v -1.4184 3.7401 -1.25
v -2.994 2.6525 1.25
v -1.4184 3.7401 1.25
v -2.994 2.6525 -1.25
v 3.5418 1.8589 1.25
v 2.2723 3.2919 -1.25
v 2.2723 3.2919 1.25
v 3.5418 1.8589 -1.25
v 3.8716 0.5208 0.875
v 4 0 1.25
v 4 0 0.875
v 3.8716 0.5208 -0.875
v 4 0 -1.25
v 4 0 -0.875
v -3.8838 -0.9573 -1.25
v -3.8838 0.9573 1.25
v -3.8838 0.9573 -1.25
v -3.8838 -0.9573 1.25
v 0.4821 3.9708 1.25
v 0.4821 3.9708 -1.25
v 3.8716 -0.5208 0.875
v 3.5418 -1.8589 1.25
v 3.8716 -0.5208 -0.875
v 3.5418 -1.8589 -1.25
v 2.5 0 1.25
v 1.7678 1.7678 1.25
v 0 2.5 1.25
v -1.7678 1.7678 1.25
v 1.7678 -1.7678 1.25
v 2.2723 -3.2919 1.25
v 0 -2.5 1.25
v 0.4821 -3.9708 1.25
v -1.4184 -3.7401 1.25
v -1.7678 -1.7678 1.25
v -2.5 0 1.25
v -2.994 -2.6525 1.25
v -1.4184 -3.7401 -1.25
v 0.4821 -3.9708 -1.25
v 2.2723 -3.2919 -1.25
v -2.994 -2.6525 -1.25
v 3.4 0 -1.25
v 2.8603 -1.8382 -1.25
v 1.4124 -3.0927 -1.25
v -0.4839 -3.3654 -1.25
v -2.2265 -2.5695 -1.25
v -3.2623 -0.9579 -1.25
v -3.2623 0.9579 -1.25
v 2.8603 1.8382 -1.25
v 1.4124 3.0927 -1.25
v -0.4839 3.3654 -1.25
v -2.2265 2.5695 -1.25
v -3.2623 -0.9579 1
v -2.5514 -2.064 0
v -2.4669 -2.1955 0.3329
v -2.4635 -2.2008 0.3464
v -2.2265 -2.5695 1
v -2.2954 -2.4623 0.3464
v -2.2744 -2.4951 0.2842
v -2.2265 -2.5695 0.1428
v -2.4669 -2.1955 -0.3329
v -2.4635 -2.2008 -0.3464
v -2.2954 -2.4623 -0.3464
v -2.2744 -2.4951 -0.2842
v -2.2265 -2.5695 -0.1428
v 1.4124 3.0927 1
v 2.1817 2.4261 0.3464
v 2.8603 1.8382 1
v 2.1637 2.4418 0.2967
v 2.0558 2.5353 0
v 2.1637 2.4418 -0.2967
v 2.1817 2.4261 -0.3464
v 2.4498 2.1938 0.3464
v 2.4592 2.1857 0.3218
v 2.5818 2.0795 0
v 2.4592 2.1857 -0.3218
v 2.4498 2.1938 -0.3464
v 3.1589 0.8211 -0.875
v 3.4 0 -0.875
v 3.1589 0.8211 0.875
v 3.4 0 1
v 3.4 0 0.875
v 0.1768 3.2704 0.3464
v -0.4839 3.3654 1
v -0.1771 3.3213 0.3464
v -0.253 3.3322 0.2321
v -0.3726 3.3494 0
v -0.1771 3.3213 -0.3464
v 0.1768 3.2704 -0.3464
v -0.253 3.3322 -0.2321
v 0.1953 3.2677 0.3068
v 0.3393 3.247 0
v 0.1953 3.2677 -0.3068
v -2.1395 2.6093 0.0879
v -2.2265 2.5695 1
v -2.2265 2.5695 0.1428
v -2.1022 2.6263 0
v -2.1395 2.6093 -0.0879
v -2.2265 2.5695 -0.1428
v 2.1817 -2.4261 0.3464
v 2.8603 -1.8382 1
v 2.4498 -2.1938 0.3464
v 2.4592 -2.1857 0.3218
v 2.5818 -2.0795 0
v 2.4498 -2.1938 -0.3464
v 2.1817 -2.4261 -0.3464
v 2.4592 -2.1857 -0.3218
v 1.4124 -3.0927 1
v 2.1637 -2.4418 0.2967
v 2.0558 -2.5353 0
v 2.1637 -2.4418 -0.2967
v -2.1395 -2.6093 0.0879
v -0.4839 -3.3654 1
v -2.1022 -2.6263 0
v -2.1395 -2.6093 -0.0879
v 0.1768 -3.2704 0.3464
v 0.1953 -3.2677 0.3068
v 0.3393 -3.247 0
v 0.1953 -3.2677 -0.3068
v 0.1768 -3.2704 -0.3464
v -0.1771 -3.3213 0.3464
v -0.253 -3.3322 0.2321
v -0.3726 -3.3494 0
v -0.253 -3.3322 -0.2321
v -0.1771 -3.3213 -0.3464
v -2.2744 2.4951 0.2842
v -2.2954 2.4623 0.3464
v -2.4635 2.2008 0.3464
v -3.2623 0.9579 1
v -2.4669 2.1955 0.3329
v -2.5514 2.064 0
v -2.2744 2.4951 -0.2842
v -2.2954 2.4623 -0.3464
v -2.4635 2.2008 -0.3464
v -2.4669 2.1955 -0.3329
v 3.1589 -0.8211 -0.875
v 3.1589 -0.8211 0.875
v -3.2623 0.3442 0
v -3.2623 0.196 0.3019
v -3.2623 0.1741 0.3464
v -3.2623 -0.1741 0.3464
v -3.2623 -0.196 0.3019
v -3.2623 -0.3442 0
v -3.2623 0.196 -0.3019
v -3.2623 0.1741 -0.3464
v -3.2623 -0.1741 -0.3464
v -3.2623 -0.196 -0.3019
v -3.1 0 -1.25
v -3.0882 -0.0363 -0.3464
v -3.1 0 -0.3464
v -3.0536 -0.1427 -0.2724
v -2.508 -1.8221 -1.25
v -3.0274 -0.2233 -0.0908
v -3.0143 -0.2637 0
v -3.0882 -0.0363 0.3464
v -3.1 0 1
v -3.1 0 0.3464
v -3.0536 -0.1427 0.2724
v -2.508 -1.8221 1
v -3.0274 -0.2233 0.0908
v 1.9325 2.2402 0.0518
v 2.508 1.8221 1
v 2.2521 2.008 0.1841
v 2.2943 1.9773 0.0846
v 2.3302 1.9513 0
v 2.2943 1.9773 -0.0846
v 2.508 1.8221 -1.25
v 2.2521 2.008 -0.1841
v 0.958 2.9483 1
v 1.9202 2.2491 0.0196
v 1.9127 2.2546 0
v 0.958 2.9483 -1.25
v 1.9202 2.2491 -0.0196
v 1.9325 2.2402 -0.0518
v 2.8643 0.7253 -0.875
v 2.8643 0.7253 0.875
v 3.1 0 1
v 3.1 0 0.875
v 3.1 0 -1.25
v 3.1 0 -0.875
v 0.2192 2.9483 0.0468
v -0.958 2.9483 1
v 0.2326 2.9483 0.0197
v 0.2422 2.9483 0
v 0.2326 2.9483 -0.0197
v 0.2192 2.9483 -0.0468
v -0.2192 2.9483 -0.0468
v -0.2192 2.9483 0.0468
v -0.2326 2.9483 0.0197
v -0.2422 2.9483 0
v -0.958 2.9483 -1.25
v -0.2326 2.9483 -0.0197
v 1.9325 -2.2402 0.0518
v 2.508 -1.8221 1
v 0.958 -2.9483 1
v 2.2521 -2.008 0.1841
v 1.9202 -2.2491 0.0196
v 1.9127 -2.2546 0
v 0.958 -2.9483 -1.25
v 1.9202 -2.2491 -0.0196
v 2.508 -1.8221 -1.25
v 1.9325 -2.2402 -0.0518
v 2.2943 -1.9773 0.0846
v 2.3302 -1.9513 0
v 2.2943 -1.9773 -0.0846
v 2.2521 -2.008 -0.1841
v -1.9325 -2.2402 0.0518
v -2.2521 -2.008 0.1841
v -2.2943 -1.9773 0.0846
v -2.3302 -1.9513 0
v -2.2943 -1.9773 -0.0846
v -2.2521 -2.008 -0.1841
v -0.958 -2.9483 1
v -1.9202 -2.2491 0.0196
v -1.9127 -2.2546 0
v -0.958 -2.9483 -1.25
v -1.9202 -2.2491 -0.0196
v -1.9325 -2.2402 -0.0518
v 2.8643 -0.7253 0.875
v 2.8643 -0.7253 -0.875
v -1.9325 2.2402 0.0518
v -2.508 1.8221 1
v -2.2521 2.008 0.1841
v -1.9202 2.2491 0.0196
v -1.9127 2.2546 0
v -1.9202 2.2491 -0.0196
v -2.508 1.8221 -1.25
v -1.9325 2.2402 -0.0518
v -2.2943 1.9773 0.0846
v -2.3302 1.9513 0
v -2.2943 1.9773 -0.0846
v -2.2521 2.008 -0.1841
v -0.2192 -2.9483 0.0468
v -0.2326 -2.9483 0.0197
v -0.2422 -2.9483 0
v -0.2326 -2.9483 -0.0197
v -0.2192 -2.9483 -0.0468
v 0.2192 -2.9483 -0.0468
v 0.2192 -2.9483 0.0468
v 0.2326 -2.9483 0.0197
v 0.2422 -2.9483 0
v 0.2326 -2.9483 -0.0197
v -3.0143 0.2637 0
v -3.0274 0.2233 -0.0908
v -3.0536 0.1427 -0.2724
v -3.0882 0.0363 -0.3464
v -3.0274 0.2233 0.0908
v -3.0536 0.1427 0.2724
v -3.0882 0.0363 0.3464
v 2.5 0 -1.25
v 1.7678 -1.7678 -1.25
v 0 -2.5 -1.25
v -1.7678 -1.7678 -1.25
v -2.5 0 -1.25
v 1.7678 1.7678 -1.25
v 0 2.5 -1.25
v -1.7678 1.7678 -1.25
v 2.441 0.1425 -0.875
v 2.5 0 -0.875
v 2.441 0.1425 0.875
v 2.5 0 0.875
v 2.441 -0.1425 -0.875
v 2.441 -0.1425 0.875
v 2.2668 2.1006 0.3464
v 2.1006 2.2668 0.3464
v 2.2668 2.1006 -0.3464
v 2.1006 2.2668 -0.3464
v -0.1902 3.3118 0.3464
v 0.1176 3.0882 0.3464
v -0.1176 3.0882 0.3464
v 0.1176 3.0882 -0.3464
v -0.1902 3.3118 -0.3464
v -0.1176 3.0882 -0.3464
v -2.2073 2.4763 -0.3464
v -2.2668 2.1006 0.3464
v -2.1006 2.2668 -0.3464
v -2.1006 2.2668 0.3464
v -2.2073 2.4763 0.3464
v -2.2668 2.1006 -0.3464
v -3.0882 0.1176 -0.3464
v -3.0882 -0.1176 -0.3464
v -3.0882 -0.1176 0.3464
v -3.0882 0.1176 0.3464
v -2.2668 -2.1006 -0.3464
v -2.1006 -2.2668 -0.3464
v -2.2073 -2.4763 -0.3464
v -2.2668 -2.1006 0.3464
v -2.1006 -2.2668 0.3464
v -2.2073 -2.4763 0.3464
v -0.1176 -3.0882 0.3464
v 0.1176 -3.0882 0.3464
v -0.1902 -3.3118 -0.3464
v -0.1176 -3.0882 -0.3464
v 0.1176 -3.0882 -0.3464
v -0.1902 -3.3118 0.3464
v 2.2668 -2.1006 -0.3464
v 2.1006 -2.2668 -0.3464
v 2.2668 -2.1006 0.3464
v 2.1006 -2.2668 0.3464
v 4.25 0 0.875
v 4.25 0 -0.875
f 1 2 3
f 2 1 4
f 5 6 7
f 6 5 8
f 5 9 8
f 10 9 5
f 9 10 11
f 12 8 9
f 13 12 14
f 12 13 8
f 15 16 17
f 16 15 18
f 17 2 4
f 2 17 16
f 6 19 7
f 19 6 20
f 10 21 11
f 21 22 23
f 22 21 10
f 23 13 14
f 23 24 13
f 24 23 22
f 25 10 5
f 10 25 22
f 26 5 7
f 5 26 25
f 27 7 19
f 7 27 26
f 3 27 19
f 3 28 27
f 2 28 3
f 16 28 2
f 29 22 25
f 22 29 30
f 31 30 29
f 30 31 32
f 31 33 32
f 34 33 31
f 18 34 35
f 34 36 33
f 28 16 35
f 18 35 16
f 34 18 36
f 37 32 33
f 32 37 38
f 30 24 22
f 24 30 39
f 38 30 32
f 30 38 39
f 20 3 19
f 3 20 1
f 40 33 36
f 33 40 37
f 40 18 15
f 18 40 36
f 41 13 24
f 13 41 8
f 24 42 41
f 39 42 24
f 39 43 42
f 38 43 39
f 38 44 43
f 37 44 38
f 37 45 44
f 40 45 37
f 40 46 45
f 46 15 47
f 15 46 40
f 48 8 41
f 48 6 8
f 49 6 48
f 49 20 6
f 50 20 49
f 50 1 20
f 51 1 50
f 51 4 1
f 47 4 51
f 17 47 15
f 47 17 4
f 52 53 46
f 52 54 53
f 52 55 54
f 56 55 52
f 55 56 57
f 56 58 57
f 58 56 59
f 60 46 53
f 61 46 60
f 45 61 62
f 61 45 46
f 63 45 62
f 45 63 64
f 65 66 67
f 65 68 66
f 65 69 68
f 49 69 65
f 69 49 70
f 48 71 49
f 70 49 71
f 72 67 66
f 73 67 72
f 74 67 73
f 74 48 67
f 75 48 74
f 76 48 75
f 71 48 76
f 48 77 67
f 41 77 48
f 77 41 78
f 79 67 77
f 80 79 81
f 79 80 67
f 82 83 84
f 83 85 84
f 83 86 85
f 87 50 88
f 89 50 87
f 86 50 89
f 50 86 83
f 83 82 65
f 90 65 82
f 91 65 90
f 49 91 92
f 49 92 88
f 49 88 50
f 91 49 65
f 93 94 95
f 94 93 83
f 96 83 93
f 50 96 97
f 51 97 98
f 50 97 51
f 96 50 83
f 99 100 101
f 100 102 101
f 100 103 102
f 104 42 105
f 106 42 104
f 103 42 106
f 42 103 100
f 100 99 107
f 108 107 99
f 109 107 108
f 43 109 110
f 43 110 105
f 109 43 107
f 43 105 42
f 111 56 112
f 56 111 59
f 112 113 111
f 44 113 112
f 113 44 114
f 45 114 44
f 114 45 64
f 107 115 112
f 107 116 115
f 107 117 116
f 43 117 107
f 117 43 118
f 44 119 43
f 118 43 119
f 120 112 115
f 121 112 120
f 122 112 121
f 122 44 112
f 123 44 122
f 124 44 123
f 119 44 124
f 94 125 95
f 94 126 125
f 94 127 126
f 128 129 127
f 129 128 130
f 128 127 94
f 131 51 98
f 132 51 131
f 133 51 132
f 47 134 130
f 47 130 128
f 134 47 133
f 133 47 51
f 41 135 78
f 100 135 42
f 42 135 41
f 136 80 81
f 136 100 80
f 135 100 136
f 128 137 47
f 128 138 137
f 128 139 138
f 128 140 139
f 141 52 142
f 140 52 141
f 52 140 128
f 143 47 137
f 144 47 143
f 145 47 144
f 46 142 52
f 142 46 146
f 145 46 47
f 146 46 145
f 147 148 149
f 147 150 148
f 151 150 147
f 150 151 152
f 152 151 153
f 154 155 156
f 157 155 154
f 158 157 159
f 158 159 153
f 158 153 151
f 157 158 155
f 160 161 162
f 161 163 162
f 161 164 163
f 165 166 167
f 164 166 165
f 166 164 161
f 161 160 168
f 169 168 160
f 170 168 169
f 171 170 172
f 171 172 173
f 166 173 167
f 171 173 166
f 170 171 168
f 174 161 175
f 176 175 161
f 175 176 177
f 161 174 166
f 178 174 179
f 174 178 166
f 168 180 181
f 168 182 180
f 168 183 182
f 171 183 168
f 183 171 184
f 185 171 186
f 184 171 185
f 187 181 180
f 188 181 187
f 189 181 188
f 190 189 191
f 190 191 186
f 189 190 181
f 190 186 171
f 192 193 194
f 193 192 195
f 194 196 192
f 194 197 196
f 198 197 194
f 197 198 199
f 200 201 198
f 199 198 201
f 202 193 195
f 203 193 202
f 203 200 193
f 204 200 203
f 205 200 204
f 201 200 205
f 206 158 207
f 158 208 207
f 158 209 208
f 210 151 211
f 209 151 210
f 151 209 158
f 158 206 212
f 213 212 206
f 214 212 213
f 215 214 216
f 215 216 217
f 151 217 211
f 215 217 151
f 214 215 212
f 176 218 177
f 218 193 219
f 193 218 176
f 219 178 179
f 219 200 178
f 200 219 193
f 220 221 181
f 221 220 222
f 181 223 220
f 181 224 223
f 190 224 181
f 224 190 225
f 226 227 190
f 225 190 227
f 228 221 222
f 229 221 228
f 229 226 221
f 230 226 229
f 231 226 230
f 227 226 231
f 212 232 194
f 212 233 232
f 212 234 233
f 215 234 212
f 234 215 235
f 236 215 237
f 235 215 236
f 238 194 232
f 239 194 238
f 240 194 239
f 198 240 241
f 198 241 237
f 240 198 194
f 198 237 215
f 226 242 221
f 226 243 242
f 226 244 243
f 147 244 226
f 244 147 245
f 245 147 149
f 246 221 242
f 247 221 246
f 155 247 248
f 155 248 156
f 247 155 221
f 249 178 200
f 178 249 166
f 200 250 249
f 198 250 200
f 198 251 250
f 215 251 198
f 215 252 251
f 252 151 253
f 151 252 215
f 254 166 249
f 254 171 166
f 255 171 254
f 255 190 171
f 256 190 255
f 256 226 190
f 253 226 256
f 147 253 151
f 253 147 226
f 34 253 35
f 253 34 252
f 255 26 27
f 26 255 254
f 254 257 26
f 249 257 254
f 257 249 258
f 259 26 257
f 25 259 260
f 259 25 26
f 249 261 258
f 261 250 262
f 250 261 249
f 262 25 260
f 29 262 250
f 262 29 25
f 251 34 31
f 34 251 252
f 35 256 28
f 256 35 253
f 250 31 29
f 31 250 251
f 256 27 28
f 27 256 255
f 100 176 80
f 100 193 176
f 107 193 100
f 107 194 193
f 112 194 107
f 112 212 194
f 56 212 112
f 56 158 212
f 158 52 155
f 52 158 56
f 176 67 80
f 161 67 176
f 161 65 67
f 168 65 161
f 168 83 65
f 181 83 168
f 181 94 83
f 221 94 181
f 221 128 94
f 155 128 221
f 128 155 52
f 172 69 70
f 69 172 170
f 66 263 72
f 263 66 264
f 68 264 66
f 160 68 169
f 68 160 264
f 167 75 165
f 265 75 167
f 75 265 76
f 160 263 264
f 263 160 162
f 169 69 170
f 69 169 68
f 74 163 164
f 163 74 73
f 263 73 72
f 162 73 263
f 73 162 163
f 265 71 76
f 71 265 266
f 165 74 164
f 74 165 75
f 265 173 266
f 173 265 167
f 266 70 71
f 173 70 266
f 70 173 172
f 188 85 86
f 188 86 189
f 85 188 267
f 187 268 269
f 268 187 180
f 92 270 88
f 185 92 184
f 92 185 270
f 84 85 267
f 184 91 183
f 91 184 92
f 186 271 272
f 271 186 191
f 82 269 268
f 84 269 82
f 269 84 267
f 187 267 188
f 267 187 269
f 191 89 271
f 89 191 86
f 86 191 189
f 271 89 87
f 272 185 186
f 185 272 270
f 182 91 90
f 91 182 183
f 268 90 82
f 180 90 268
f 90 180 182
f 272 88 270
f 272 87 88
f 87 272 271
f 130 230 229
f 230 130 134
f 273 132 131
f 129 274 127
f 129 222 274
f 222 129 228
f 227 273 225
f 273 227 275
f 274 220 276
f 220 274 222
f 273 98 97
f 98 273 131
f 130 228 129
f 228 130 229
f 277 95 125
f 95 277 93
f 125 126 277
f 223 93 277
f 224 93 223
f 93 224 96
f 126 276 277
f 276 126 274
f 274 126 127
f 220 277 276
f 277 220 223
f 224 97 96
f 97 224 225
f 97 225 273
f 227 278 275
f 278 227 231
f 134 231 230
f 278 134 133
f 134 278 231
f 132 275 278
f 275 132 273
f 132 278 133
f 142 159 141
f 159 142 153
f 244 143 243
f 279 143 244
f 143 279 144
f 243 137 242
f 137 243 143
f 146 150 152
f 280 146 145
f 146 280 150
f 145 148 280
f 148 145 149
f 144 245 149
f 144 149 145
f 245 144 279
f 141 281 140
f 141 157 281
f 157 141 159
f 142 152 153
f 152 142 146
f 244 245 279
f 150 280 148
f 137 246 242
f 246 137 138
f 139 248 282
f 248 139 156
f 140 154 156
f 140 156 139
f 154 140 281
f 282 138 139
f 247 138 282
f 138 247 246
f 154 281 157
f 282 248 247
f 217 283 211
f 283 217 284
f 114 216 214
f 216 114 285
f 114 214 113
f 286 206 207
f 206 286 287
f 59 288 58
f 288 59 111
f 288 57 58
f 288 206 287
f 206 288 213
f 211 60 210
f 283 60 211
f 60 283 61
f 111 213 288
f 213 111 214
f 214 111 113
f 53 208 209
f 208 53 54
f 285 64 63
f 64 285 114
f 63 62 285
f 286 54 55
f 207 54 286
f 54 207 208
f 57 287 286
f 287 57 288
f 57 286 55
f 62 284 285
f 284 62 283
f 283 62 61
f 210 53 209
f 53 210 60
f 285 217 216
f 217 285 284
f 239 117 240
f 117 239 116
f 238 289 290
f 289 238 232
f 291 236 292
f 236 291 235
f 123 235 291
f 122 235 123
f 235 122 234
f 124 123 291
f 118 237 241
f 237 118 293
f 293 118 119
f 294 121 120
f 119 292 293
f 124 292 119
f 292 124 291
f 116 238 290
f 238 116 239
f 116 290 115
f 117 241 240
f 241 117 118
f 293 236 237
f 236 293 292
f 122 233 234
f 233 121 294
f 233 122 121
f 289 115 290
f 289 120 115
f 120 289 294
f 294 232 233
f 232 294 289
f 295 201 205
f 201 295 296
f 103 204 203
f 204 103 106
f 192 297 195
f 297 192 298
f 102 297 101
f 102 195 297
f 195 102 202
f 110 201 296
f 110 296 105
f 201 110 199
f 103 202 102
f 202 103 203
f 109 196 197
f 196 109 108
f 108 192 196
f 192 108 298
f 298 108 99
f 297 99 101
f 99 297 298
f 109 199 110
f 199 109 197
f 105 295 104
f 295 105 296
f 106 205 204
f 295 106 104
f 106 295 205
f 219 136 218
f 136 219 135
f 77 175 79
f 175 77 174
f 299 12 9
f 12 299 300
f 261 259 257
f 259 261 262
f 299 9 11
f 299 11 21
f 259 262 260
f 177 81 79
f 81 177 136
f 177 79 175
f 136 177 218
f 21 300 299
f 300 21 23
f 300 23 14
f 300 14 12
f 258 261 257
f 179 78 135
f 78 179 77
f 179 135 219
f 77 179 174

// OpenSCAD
// Parameters
bore_diameter_mm = 5.0; //[2.5:10.0:0.1]
outer_diameter_mm = 8.0; //[4.0:16.0:0.1]
width_mm = 2.5; //[1.25:5.0:0.05]
race_radial_thickness_mm = 0.6; //[0.3:1.2:0.05]
race_axial_margin_mm = 0.25; //[0.1:0.6:0.05]
shield_thickness_mm = 0.25; //[0.1:0.6:0.05]
shield_radial_overlap_mm = 0.2; //[0.05:0.6:0.05]
ball_diameter_mm = 0.8; //[0.4:1.4:0.05]
ball_count = 8; //[5:14:1]
connection_overlap_mm = 0.6; //[0.2:1.5:0.1]

// Bearing Ball - complete geometry
module bearing_ball() {
  color("Silver") {
    sphere(r=ball_diameter_mm/2);
  }
}

// Ball Bearing - complete geometry
module ball_bearing() {
  color("DimGray") {
    // Outer Race
    difference() {
      cylinder(r=outer_diameter_mm/2, h=width_mm, center=true);
      cylinder(r=outer_diameter_mm/2 - race_radial_thickness_mm, h=width_mm + 2*connection_overlap_mm, center=true);
    }
    // Inner Race
    difference() {
      cylinder(r=bore_diameter_mm/2 + race_radial_thickness_mm, h=width_mm, center=true);
      cylinder(r=bore_diameter_mm/2, h=width_mm + 2*connection_overlap_mm, center=true);
    }
    // Shield or Seal
    difference() {
      translate([0, 0, width_mm/2 - shield_thickness_mm/2])
        cylinder(r=outer_diameter_mm/2 - race_radial_thickness_mm + shield_radial_overlap_mm, h=shield_thickness_mm, center=true);
      translate([0, 0, width_mm/2 - shield_thickness_mm/2])
        cylinder(r=bore_diameter_mm/2 + race_radial_thickness_mm - shield_radial_overlap_mm, h=shield_thickness_mm + 2*connection_overlap_mm, center=true);
    }
  }
  
  // Bearing Balls
  for (i = [0:ball_count-1]) {
    rotate([0, 0, i*360/ball_count]) 
      translate([(bore_diameter_mm/2 + race_radial_thickness_mm + (outer_diameter_mm/2 - race_radial_thickness_mm))/2, 0, 0])
        bearing_ball();
  }
  
  // Ball Bridge
  color("Silver") {
    translate([(bore_diameter_mm/2 + race_radial_thickness_mm + (outer_diameter_mm/2 - race_radial_thickness_mm))/2, 0, 0])
      cylinder(r=ball_diameter_mm/2 + connection_overlap_mm, h=width_mm - 2*(race_axial_margin_mm + shield_thickness_mm/2), center=true);
  }
}

// Assembly
module assembly() {
  ball_bearing();
}

assembly();
